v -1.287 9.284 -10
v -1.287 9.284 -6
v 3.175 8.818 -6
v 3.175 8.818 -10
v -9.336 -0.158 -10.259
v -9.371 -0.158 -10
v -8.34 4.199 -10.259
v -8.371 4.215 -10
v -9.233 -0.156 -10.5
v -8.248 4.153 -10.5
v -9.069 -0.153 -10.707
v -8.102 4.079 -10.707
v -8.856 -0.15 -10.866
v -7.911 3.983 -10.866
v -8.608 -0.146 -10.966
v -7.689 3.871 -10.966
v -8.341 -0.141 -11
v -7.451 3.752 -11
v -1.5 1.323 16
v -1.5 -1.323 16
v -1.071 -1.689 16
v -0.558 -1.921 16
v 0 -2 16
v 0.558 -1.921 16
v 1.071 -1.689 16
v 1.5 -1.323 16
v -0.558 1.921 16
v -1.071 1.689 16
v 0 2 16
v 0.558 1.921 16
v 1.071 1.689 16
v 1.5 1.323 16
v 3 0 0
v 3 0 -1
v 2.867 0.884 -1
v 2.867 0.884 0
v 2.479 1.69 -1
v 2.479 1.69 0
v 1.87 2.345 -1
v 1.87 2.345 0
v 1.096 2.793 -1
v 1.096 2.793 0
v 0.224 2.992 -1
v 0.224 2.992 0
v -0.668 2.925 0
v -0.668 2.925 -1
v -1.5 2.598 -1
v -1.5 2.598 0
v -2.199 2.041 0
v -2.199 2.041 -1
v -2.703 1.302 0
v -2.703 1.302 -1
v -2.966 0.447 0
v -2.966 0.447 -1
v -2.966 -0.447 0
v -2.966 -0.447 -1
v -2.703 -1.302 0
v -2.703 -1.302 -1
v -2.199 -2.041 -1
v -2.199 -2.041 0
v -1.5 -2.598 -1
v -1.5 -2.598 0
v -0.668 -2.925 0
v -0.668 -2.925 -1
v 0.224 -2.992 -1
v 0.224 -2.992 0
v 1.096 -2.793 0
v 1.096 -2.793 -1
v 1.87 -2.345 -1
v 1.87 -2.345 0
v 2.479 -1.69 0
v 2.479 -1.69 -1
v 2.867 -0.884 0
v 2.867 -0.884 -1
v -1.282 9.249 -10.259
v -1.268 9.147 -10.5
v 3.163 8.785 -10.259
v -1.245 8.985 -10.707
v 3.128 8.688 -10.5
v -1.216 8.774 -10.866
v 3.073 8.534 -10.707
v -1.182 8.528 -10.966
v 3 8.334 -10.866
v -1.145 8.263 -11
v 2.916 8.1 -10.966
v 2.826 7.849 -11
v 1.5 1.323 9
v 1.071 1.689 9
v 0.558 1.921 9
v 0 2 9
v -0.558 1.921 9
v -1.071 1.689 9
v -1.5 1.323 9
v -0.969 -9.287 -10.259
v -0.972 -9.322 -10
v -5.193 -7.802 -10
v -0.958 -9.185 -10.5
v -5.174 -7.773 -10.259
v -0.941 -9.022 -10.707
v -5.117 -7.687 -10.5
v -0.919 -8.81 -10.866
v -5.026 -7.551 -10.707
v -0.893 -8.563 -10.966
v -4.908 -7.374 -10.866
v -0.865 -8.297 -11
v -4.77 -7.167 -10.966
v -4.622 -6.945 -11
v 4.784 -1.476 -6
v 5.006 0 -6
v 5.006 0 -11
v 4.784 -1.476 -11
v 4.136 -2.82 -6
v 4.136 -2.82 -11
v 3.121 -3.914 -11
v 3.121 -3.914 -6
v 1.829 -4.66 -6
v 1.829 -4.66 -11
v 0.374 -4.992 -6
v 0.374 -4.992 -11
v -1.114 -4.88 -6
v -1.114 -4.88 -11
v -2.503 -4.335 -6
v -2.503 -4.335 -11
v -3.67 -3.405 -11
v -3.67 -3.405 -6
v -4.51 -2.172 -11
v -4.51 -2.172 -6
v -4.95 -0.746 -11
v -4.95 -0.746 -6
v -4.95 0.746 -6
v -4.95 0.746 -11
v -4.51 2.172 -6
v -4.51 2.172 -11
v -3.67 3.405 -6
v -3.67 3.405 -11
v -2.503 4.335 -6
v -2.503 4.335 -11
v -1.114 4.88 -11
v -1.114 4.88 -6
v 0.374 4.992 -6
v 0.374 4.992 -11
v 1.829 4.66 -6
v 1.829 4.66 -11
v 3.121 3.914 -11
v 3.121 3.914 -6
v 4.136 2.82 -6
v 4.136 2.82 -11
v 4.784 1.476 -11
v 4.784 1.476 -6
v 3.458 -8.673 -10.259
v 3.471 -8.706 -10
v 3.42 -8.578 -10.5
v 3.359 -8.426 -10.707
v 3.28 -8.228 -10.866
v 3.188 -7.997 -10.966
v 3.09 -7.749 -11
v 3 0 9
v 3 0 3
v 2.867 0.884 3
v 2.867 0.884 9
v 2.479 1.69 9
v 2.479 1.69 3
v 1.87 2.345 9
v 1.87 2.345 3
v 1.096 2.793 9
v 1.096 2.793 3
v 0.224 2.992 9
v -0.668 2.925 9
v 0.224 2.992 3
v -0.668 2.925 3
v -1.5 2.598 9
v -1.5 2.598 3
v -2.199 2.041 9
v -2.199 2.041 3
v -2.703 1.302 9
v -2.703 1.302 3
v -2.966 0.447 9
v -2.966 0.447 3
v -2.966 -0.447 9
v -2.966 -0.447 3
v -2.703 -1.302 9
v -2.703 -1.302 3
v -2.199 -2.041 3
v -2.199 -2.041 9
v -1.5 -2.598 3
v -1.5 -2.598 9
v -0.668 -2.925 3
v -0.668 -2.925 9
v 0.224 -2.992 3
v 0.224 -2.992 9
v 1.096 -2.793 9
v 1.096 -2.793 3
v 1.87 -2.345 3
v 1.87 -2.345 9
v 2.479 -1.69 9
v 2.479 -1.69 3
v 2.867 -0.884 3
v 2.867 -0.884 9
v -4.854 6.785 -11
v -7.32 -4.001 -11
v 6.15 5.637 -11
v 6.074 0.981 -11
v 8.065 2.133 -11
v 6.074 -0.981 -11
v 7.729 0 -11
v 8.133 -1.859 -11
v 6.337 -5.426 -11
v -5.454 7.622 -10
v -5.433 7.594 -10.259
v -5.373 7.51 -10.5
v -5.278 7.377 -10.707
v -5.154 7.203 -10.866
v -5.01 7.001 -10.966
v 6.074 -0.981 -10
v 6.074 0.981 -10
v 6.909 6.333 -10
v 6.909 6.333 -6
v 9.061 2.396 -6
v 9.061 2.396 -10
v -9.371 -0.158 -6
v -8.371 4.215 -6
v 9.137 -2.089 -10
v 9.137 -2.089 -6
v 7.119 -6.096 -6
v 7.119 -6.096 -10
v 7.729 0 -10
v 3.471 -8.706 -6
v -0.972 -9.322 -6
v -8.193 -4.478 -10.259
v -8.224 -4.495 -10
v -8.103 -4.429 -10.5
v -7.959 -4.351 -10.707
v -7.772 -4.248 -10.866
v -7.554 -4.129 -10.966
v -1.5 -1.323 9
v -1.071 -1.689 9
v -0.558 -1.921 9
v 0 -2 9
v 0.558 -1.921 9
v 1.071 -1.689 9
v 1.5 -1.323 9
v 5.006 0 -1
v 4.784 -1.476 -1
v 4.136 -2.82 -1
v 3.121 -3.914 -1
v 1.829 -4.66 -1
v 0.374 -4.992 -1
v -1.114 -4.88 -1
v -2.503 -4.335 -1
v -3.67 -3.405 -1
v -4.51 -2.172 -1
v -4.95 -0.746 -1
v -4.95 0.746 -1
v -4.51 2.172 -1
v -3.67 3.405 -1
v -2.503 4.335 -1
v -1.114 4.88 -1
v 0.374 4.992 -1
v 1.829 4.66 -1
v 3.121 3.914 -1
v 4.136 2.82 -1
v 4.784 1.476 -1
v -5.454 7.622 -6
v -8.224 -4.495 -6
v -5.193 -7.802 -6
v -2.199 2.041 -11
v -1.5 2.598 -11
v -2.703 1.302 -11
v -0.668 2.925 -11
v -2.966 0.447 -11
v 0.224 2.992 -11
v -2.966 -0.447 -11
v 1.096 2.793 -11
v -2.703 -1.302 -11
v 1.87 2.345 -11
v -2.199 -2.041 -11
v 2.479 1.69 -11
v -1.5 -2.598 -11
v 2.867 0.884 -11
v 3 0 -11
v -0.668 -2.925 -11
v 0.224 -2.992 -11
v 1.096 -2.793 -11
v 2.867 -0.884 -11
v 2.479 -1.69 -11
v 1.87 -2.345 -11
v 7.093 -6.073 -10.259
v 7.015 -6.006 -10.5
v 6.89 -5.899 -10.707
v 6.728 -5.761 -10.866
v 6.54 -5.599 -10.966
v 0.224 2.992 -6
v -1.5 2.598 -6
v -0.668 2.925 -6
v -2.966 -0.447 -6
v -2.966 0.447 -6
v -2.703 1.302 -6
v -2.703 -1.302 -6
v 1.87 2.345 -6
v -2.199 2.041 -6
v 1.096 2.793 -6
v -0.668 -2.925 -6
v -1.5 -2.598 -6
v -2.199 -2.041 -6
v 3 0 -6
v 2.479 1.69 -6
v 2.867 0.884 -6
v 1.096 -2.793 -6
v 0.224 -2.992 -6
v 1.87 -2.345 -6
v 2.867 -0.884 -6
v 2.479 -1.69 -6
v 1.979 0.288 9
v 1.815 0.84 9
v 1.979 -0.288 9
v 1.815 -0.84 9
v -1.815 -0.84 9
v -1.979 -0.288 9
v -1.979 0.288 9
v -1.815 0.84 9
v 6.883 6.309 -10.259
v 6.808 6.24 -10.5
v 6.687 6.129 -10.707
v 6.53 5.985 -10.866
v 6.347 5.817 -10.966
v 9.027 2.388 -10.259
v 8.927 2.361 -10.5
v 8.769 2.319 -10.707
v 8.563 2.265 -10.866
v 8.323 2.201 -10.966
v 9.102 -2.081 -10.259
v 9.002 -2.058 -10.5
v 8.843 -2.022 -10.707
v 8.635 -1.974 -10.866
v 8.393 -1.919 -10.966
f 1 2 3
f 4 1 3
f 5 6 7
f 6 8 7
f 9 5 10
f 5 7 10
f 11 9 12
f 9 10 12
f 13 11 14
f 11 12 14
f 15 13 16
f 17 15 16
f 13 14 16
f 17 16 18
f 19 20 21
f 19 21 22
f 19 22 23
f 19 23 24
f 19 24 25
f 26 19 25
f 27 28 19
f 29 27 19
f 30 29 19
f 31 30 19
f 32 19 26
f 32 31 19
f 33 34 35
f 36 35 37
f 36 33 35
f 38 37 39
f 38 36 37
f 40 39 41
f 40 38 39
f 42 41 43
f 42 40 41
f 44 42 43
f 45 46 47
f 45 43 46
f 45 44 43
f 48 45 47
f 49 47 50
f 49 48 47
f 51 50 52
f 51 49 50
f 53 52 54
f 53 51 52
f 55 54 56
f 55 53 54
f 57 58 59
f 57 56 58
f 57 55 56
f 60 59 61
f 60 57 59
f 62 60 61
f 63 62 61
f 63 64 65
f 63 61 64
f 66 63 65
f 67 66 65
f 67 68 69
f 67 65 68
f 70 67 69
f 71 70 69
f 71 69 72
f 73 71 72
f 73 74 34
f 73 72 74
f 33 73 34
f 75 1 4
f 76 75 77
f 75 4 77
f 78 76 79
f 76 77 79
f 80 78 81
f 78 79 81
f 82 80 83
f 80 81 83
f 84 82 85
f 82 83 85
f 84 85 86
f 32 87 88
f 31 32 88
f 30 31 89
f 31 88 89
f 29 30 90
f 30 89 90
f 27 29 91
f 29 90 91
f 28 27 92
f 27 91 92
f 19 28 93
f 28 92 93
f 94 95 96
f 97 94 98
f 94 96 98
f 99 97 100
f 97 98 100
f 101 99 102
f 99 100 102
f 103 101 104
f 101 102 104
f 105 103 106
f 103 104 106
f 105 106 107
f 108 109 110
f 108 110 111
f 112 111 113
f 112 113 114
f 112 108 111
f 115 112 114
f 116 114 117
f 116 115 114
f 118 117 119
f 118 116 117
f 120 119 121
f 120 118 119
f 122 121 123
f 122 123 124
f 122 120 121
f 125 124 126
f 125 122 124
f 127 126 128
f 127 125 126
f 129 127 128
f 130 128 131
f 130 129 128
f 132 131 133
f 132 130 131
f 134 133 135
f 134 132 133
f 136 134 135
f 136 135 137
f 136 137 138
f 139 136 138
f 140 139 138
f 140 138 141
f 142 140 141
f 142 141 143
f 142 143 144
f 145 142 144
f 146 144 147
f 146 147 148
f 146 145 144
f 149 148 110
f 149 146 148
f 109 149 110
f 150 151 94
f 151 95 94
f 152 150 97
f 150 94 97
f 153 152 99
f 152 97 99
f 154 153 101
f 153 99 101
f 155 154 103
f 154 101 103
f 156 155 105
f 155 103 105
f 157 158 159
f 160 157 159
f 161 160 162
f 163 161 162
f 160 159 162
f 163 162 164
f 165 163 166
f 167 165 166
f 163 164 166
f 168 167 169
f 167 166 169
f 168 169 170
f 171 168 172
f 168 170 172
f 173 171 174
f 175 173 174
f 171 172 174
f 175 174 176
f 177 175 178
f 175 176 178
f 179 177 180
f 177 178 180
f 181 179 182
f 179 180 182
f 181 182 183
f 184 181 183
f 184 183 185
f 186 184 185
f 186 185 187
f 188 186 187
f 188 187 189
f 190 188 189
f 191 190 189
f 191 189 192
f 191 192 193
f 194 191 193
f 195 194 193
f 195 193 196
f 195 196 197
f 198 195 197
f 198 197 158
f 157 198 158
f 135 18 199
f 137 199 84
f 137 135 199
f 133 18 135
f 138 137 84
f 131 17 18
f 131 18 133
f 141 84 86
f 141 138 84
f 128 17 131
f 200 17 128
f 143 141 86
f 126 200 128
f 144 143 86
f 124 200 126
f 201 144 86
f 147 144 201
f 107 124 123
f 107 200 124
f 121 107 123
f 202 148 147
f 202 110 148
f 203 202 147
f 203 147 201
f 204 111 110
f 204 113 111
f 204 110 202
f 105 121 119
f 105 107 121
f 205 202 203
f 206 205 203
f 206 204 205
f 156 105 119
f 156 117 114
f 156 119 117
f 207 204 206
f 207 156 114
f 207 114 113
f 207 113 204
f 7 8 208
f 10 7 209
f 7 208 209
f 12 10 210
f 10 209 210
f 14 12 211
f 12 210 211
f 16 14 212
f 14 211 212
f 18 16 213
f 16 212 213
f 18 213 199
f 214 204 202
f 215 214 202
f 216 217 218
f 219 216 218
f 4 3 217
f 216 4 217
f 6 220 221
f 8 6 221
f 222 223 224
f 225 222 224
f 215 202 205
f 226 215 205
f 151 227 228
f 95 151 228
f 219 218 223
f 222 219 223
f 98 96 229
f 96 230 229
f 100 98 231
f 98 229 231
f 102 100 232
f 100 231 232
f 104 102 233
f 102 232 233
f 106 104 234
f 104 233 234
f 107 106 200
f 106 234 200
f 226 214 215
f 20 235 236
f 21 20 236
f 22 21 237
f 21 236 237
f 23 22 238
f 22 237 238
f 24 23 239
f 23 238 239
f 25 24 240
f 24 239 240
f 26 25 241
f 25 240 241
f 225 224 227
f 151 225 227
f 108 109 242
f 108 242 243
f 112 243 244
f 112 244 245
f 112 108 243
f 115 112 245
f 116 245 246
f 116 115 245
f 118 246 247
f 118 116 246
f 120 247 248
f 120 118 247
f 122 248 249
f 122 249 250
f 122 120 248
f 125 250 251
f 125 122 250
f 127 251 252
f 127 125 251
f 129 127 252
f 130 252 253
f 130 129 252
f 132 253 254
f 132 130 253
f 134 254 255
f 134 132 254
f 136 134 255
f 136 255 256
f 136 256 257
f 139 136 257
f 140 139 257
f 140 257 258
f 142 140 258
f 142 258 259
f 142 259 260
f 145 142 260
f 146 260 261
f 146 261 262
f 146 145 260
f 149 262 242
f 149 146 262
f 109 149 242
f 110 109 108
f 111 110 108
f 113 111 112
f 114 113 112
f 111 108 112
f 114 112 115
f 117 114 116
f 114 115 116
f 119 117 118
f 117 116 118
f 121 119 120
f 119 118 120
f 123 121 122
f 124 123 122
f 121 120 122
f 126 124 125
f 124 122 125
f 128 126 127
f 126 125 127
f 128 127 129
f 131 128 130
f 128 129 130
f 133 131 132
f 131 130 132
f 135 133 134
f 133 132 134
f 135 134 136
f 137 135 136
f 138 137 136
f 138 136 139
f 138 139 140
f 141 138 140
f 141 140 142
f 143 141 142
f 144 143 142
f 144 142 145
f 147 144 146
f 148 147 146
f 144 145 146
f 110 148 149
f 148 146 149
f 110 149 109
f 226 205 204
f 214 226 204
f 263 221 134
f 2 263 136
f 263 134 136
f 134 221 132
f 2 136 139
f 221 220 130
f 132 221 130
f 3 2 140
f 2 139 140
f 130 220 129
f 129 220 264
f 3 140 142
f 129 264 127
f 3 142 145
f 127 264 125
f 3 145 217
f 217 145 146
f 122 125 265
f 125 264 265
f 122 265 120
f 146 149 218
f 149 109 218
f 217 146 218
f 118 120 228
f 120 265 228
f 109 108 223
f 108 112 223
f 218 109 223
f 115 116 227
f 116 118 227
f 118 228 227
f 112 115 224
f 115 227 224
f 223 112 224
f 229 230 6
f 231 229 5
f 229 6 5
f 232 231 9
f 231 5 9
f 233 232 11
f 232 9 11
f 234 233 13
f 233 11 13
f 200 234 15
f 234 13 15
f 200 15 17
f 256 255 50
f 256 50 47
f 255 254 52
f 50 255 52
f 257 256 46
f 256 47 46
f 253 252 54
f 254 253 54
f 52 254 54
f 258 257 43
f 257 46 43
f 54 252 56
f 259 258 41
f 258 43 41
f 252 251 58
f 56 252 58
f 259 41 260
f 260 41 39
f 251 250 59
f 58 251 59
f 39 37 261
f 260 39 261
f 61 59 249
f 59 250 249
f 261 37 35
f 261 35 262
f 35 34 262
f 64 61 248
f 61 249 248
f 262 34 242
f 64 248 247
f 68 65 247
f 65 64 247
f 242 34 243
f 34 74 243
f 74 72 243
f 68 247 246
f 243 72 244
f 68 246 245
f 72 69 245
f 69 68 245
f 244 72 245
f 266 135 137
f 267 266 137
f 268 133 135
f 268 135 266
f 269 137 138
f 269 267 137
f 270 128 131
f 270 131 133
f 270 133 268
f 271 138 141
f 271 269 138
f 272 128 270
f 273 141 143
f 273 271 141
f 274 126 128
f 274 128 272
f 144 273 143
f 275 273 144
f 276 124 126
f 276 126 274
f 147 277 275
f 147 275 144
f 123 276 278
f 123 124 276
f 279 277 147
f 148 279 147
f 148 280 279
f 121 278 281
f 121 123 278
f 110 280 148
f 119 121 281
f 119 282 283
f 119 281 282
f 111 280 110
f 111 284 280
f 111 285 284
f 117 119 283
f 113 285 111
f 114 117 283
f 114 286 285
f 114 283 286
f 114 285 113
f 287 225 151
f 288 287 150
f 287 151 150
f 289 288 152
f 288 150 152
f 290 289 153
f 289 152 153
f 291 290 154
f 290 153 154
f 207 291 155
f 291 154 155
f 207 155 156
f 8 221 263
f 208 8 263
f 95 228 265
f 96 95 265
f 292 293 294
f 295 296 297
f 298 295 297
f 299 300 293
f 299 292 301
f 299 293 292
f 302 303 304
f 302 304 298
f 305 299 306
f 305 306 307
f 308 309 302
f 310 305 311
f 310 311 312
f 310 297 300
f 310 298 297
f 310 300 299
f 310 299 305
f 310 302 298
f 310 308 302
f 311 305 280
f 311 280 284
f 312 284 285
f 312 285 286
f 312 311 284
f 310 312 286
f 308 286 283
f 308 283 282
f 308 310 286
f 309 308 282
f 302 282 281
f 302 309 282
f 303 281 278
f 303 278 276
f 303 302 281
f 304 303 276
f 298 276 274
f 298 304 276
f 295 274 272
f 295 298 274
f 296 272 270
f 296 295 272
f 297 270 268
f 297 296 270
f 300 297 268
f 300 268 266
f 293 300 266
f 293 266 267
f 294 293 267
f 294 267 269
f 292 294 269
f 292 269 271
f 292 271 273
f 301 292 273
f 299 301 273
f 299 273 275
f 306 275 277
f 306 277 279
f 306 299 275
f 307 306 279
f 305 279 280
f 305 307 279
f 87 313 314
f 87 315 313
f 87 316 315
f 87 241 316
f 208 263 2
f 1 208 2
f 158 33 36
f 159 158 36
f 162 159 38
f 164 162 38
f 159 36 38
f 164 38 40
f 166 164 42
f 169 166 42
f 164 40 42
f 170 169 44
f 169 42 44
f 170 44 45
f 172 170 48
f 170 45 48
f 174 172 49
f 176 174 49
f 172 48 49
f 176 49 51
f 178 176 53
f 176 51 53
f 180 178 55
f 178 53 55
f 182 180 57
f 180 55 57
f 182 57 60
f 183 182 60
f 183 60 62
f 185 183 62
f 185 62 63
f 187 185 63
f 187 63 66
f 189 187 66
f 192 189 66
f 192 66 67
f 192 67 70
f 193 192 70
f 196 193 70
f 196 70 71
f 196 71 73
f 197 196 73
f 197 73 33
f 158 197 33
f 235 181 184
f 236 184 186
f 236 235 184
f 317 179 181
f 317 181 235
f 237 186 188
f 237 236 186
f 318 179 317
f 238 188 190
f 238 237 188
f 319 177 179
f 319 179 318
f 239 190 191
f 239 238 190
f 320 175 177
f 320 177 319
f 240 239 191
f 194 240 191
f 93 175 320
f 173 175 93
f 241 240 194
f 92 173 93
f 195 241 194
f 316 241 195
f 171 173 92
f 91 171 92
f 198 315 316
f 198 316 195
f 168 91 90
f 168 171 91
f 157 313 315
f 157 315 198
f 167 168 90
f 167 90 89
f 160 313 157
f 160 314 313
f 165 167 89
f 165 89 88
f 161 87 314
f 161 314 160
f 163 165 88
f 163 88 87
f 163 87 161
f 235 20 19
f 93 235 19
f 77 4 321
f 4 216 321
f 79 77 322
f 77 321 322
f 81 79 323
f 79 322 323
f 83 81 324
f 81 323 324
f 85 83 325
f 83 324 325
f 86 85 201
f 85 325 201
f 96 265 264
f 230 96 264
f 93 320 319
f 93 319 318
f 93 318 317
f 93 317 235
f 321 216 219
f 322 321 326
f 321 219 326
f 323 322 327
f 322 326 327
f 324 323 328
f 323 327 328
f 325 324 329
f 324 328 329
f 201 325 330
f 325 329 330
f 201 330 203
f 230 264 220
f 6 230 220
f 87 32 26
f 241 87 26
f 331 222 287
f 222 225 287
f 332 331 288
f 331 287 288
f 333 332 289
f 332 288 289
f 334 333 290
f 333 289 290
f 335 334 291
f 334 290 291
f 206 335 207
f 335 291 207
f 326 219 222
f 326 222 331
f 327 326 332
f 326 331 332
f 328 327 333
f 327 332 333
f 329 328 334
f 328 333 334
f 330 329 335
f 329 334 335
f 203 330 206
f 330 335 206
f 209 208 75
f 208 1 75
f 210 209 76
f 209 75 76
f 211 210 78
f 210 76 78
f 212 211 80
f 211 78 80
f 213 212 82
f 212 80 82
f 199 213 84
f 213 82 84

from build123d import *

# Parameters (mm, degrees)
F0_R           = 3
F1_DEPTH       = 9
F1_FACE_R      = 3
F2_DEPTH       = 6
F3_R           = 2
F4_DEPTH       = 7
F3_R_2         = 3
F5_DEPTH       = 7
F7_DEPTH       = 7
F8_R           = 5.0059936483
F9_DEPTH       = 5
F10_R          = 1
F8_R_2         = 3
F12_DEPTH      = 5
F12_DEPTH_BACK = 5
F13_DEPTH      = 1


with BuildPart() as f1:
    # F0 (on Top) → F1 (new body)
    with BuildSketch(Plane.XY):
        Circle(F0_R)
    extrude(amount=F1_DEPTH)

    # F0 (on Top) + F1_face (on face) → F2 (join)
    with BuildSketch(Plane.XY):
        Circle(F0_R)
    with BuildSketch(Plane.XY.offset(9)):
        Circle(F1_FACE_R)
    extrude(amount=-F2_DEPTH)

    # F3 (on face) → F4 (join)
    with BuildSketch(Plane.XY.offset(9)):
        Circle(F3_R)
    extrude(amount=F4_DEPTH)

    # F3 (on face) → F5 (cut)
    with BuildSketch(Plane.XY.offset(9)):
        Circle(F3_R_2)
        Circle(F3_R, mode=Mode.SUBTRACT)
    extrude(amount=F5_DEPTH, mode=Mode.SUBTRACT)

    # F6 (on face) → F7 (cut)
    with BuildSketch(Plane.XY.offset(16)):
        with BuildLine():
            Line((-1.5, -1.3228756555), (-1.5, 1.3228756555))
            ThreePointArc((-1.5, 1.3228756555), (-2, 0), (-1.5, -1.3228756555))
        make_face()
        with BuildLine():
            ThreePointArc((2, 0), (1.8708286934, 0.7071067812), (1.5, 1.3228756555))
            Line((1.5, 1.3228756555), (1.5, -1.3228756555))
            ThreePointArc((1.5, -1.3228756555), (1.8708286934, -0.7071067812), (2, 0))
        make_face()
    extrude(amount=-F7_DEPTH, mode=Mode.SUBTRACT)

    # F8 (on face) → F12 (join, two sides)
    with BuildSketch(Plane(origin=(0, 0, -6), x_dir=(1, 0, 0), z_dir=(0, 0, -1))) as f12_sk:
        Circle(F8_R)
        Circle(F8_R_2, mode=Mode.SUBTRACT)
    extrude(amount=-F12_DEPTH)
    extrude(f12_sk.sketch, amount=F12_DEPTH_BACK)


with BuildPart() as f9:
    # F8 (on face) → F9 (new body)
    with BuildSketch(Plane(origin=(0, 0, -6), x_dir=(1, 0, 0), z_dir=(0, 0, -1))):
        Polygon((-5.1929931591, 7.8022541948), (-8.2240554024, 4.4952487372), (-9.3710856636, 0.1584359675), (-8.3713131331, -4.214672573), (-5.4537736491, -7.6222504193), (-1.2868403472, -9.2836625527), (3.1748925702, -8.8182994754), (6.9092958614, -6.3327702604), (9.0608627367, -2.3964796969), (9.1366951543, 2.0888154845), (7.1194208212, 6.0955882113), (3.4711729762, 8.7059351387), (-0.9722787654, 9.3218572438), align=None)
        Circle(F8_R, mode=Mode.SUBTRACT)
    extrude(amount=F9_DEPTH)

    # F10
    f10_edges = [f9.edges().sort_by_distance(p)[0] for p in [
        (-6.708524, -6.148751, -11),
        (-3.082636, -8.562056, -11),
        (1.249447, -9.013896, -11),
        (5.295297, -7.400762, -11),
        (8.128058, -4.092202, -11),
        (9.098779, 0.153832, -11),
        (7.985079, 4.364625, -11),
        (5.042094, 7.575535, -11),
        (0.944026, 9.050981, -11),
        (-3.370307, 8.452956, -11),
        (-6.912543, 5.918461, -11),
        (-8.871199, 2.028118, -11),
        (-8.797571, -2.326842, -11),
    ]]
    fillet(f10_edges, radius=F10_R)

    # F11 (on face) → F13 (cut)
    with BuildSketch(Plane(origin=(0, 0, -11), x_dir=(1, 0, 0), z_dir=(0, 0, -1))):
        Polygon((7.7285151929, 0), (6.0742069036, 0.9805487934), (6.0742069036, -0.9805487934), align=None)
    extrude(amount=-F13_DEPTH, mode=Mode.SUBTRACT)


solid = Compound([f1.part, f9.part])
